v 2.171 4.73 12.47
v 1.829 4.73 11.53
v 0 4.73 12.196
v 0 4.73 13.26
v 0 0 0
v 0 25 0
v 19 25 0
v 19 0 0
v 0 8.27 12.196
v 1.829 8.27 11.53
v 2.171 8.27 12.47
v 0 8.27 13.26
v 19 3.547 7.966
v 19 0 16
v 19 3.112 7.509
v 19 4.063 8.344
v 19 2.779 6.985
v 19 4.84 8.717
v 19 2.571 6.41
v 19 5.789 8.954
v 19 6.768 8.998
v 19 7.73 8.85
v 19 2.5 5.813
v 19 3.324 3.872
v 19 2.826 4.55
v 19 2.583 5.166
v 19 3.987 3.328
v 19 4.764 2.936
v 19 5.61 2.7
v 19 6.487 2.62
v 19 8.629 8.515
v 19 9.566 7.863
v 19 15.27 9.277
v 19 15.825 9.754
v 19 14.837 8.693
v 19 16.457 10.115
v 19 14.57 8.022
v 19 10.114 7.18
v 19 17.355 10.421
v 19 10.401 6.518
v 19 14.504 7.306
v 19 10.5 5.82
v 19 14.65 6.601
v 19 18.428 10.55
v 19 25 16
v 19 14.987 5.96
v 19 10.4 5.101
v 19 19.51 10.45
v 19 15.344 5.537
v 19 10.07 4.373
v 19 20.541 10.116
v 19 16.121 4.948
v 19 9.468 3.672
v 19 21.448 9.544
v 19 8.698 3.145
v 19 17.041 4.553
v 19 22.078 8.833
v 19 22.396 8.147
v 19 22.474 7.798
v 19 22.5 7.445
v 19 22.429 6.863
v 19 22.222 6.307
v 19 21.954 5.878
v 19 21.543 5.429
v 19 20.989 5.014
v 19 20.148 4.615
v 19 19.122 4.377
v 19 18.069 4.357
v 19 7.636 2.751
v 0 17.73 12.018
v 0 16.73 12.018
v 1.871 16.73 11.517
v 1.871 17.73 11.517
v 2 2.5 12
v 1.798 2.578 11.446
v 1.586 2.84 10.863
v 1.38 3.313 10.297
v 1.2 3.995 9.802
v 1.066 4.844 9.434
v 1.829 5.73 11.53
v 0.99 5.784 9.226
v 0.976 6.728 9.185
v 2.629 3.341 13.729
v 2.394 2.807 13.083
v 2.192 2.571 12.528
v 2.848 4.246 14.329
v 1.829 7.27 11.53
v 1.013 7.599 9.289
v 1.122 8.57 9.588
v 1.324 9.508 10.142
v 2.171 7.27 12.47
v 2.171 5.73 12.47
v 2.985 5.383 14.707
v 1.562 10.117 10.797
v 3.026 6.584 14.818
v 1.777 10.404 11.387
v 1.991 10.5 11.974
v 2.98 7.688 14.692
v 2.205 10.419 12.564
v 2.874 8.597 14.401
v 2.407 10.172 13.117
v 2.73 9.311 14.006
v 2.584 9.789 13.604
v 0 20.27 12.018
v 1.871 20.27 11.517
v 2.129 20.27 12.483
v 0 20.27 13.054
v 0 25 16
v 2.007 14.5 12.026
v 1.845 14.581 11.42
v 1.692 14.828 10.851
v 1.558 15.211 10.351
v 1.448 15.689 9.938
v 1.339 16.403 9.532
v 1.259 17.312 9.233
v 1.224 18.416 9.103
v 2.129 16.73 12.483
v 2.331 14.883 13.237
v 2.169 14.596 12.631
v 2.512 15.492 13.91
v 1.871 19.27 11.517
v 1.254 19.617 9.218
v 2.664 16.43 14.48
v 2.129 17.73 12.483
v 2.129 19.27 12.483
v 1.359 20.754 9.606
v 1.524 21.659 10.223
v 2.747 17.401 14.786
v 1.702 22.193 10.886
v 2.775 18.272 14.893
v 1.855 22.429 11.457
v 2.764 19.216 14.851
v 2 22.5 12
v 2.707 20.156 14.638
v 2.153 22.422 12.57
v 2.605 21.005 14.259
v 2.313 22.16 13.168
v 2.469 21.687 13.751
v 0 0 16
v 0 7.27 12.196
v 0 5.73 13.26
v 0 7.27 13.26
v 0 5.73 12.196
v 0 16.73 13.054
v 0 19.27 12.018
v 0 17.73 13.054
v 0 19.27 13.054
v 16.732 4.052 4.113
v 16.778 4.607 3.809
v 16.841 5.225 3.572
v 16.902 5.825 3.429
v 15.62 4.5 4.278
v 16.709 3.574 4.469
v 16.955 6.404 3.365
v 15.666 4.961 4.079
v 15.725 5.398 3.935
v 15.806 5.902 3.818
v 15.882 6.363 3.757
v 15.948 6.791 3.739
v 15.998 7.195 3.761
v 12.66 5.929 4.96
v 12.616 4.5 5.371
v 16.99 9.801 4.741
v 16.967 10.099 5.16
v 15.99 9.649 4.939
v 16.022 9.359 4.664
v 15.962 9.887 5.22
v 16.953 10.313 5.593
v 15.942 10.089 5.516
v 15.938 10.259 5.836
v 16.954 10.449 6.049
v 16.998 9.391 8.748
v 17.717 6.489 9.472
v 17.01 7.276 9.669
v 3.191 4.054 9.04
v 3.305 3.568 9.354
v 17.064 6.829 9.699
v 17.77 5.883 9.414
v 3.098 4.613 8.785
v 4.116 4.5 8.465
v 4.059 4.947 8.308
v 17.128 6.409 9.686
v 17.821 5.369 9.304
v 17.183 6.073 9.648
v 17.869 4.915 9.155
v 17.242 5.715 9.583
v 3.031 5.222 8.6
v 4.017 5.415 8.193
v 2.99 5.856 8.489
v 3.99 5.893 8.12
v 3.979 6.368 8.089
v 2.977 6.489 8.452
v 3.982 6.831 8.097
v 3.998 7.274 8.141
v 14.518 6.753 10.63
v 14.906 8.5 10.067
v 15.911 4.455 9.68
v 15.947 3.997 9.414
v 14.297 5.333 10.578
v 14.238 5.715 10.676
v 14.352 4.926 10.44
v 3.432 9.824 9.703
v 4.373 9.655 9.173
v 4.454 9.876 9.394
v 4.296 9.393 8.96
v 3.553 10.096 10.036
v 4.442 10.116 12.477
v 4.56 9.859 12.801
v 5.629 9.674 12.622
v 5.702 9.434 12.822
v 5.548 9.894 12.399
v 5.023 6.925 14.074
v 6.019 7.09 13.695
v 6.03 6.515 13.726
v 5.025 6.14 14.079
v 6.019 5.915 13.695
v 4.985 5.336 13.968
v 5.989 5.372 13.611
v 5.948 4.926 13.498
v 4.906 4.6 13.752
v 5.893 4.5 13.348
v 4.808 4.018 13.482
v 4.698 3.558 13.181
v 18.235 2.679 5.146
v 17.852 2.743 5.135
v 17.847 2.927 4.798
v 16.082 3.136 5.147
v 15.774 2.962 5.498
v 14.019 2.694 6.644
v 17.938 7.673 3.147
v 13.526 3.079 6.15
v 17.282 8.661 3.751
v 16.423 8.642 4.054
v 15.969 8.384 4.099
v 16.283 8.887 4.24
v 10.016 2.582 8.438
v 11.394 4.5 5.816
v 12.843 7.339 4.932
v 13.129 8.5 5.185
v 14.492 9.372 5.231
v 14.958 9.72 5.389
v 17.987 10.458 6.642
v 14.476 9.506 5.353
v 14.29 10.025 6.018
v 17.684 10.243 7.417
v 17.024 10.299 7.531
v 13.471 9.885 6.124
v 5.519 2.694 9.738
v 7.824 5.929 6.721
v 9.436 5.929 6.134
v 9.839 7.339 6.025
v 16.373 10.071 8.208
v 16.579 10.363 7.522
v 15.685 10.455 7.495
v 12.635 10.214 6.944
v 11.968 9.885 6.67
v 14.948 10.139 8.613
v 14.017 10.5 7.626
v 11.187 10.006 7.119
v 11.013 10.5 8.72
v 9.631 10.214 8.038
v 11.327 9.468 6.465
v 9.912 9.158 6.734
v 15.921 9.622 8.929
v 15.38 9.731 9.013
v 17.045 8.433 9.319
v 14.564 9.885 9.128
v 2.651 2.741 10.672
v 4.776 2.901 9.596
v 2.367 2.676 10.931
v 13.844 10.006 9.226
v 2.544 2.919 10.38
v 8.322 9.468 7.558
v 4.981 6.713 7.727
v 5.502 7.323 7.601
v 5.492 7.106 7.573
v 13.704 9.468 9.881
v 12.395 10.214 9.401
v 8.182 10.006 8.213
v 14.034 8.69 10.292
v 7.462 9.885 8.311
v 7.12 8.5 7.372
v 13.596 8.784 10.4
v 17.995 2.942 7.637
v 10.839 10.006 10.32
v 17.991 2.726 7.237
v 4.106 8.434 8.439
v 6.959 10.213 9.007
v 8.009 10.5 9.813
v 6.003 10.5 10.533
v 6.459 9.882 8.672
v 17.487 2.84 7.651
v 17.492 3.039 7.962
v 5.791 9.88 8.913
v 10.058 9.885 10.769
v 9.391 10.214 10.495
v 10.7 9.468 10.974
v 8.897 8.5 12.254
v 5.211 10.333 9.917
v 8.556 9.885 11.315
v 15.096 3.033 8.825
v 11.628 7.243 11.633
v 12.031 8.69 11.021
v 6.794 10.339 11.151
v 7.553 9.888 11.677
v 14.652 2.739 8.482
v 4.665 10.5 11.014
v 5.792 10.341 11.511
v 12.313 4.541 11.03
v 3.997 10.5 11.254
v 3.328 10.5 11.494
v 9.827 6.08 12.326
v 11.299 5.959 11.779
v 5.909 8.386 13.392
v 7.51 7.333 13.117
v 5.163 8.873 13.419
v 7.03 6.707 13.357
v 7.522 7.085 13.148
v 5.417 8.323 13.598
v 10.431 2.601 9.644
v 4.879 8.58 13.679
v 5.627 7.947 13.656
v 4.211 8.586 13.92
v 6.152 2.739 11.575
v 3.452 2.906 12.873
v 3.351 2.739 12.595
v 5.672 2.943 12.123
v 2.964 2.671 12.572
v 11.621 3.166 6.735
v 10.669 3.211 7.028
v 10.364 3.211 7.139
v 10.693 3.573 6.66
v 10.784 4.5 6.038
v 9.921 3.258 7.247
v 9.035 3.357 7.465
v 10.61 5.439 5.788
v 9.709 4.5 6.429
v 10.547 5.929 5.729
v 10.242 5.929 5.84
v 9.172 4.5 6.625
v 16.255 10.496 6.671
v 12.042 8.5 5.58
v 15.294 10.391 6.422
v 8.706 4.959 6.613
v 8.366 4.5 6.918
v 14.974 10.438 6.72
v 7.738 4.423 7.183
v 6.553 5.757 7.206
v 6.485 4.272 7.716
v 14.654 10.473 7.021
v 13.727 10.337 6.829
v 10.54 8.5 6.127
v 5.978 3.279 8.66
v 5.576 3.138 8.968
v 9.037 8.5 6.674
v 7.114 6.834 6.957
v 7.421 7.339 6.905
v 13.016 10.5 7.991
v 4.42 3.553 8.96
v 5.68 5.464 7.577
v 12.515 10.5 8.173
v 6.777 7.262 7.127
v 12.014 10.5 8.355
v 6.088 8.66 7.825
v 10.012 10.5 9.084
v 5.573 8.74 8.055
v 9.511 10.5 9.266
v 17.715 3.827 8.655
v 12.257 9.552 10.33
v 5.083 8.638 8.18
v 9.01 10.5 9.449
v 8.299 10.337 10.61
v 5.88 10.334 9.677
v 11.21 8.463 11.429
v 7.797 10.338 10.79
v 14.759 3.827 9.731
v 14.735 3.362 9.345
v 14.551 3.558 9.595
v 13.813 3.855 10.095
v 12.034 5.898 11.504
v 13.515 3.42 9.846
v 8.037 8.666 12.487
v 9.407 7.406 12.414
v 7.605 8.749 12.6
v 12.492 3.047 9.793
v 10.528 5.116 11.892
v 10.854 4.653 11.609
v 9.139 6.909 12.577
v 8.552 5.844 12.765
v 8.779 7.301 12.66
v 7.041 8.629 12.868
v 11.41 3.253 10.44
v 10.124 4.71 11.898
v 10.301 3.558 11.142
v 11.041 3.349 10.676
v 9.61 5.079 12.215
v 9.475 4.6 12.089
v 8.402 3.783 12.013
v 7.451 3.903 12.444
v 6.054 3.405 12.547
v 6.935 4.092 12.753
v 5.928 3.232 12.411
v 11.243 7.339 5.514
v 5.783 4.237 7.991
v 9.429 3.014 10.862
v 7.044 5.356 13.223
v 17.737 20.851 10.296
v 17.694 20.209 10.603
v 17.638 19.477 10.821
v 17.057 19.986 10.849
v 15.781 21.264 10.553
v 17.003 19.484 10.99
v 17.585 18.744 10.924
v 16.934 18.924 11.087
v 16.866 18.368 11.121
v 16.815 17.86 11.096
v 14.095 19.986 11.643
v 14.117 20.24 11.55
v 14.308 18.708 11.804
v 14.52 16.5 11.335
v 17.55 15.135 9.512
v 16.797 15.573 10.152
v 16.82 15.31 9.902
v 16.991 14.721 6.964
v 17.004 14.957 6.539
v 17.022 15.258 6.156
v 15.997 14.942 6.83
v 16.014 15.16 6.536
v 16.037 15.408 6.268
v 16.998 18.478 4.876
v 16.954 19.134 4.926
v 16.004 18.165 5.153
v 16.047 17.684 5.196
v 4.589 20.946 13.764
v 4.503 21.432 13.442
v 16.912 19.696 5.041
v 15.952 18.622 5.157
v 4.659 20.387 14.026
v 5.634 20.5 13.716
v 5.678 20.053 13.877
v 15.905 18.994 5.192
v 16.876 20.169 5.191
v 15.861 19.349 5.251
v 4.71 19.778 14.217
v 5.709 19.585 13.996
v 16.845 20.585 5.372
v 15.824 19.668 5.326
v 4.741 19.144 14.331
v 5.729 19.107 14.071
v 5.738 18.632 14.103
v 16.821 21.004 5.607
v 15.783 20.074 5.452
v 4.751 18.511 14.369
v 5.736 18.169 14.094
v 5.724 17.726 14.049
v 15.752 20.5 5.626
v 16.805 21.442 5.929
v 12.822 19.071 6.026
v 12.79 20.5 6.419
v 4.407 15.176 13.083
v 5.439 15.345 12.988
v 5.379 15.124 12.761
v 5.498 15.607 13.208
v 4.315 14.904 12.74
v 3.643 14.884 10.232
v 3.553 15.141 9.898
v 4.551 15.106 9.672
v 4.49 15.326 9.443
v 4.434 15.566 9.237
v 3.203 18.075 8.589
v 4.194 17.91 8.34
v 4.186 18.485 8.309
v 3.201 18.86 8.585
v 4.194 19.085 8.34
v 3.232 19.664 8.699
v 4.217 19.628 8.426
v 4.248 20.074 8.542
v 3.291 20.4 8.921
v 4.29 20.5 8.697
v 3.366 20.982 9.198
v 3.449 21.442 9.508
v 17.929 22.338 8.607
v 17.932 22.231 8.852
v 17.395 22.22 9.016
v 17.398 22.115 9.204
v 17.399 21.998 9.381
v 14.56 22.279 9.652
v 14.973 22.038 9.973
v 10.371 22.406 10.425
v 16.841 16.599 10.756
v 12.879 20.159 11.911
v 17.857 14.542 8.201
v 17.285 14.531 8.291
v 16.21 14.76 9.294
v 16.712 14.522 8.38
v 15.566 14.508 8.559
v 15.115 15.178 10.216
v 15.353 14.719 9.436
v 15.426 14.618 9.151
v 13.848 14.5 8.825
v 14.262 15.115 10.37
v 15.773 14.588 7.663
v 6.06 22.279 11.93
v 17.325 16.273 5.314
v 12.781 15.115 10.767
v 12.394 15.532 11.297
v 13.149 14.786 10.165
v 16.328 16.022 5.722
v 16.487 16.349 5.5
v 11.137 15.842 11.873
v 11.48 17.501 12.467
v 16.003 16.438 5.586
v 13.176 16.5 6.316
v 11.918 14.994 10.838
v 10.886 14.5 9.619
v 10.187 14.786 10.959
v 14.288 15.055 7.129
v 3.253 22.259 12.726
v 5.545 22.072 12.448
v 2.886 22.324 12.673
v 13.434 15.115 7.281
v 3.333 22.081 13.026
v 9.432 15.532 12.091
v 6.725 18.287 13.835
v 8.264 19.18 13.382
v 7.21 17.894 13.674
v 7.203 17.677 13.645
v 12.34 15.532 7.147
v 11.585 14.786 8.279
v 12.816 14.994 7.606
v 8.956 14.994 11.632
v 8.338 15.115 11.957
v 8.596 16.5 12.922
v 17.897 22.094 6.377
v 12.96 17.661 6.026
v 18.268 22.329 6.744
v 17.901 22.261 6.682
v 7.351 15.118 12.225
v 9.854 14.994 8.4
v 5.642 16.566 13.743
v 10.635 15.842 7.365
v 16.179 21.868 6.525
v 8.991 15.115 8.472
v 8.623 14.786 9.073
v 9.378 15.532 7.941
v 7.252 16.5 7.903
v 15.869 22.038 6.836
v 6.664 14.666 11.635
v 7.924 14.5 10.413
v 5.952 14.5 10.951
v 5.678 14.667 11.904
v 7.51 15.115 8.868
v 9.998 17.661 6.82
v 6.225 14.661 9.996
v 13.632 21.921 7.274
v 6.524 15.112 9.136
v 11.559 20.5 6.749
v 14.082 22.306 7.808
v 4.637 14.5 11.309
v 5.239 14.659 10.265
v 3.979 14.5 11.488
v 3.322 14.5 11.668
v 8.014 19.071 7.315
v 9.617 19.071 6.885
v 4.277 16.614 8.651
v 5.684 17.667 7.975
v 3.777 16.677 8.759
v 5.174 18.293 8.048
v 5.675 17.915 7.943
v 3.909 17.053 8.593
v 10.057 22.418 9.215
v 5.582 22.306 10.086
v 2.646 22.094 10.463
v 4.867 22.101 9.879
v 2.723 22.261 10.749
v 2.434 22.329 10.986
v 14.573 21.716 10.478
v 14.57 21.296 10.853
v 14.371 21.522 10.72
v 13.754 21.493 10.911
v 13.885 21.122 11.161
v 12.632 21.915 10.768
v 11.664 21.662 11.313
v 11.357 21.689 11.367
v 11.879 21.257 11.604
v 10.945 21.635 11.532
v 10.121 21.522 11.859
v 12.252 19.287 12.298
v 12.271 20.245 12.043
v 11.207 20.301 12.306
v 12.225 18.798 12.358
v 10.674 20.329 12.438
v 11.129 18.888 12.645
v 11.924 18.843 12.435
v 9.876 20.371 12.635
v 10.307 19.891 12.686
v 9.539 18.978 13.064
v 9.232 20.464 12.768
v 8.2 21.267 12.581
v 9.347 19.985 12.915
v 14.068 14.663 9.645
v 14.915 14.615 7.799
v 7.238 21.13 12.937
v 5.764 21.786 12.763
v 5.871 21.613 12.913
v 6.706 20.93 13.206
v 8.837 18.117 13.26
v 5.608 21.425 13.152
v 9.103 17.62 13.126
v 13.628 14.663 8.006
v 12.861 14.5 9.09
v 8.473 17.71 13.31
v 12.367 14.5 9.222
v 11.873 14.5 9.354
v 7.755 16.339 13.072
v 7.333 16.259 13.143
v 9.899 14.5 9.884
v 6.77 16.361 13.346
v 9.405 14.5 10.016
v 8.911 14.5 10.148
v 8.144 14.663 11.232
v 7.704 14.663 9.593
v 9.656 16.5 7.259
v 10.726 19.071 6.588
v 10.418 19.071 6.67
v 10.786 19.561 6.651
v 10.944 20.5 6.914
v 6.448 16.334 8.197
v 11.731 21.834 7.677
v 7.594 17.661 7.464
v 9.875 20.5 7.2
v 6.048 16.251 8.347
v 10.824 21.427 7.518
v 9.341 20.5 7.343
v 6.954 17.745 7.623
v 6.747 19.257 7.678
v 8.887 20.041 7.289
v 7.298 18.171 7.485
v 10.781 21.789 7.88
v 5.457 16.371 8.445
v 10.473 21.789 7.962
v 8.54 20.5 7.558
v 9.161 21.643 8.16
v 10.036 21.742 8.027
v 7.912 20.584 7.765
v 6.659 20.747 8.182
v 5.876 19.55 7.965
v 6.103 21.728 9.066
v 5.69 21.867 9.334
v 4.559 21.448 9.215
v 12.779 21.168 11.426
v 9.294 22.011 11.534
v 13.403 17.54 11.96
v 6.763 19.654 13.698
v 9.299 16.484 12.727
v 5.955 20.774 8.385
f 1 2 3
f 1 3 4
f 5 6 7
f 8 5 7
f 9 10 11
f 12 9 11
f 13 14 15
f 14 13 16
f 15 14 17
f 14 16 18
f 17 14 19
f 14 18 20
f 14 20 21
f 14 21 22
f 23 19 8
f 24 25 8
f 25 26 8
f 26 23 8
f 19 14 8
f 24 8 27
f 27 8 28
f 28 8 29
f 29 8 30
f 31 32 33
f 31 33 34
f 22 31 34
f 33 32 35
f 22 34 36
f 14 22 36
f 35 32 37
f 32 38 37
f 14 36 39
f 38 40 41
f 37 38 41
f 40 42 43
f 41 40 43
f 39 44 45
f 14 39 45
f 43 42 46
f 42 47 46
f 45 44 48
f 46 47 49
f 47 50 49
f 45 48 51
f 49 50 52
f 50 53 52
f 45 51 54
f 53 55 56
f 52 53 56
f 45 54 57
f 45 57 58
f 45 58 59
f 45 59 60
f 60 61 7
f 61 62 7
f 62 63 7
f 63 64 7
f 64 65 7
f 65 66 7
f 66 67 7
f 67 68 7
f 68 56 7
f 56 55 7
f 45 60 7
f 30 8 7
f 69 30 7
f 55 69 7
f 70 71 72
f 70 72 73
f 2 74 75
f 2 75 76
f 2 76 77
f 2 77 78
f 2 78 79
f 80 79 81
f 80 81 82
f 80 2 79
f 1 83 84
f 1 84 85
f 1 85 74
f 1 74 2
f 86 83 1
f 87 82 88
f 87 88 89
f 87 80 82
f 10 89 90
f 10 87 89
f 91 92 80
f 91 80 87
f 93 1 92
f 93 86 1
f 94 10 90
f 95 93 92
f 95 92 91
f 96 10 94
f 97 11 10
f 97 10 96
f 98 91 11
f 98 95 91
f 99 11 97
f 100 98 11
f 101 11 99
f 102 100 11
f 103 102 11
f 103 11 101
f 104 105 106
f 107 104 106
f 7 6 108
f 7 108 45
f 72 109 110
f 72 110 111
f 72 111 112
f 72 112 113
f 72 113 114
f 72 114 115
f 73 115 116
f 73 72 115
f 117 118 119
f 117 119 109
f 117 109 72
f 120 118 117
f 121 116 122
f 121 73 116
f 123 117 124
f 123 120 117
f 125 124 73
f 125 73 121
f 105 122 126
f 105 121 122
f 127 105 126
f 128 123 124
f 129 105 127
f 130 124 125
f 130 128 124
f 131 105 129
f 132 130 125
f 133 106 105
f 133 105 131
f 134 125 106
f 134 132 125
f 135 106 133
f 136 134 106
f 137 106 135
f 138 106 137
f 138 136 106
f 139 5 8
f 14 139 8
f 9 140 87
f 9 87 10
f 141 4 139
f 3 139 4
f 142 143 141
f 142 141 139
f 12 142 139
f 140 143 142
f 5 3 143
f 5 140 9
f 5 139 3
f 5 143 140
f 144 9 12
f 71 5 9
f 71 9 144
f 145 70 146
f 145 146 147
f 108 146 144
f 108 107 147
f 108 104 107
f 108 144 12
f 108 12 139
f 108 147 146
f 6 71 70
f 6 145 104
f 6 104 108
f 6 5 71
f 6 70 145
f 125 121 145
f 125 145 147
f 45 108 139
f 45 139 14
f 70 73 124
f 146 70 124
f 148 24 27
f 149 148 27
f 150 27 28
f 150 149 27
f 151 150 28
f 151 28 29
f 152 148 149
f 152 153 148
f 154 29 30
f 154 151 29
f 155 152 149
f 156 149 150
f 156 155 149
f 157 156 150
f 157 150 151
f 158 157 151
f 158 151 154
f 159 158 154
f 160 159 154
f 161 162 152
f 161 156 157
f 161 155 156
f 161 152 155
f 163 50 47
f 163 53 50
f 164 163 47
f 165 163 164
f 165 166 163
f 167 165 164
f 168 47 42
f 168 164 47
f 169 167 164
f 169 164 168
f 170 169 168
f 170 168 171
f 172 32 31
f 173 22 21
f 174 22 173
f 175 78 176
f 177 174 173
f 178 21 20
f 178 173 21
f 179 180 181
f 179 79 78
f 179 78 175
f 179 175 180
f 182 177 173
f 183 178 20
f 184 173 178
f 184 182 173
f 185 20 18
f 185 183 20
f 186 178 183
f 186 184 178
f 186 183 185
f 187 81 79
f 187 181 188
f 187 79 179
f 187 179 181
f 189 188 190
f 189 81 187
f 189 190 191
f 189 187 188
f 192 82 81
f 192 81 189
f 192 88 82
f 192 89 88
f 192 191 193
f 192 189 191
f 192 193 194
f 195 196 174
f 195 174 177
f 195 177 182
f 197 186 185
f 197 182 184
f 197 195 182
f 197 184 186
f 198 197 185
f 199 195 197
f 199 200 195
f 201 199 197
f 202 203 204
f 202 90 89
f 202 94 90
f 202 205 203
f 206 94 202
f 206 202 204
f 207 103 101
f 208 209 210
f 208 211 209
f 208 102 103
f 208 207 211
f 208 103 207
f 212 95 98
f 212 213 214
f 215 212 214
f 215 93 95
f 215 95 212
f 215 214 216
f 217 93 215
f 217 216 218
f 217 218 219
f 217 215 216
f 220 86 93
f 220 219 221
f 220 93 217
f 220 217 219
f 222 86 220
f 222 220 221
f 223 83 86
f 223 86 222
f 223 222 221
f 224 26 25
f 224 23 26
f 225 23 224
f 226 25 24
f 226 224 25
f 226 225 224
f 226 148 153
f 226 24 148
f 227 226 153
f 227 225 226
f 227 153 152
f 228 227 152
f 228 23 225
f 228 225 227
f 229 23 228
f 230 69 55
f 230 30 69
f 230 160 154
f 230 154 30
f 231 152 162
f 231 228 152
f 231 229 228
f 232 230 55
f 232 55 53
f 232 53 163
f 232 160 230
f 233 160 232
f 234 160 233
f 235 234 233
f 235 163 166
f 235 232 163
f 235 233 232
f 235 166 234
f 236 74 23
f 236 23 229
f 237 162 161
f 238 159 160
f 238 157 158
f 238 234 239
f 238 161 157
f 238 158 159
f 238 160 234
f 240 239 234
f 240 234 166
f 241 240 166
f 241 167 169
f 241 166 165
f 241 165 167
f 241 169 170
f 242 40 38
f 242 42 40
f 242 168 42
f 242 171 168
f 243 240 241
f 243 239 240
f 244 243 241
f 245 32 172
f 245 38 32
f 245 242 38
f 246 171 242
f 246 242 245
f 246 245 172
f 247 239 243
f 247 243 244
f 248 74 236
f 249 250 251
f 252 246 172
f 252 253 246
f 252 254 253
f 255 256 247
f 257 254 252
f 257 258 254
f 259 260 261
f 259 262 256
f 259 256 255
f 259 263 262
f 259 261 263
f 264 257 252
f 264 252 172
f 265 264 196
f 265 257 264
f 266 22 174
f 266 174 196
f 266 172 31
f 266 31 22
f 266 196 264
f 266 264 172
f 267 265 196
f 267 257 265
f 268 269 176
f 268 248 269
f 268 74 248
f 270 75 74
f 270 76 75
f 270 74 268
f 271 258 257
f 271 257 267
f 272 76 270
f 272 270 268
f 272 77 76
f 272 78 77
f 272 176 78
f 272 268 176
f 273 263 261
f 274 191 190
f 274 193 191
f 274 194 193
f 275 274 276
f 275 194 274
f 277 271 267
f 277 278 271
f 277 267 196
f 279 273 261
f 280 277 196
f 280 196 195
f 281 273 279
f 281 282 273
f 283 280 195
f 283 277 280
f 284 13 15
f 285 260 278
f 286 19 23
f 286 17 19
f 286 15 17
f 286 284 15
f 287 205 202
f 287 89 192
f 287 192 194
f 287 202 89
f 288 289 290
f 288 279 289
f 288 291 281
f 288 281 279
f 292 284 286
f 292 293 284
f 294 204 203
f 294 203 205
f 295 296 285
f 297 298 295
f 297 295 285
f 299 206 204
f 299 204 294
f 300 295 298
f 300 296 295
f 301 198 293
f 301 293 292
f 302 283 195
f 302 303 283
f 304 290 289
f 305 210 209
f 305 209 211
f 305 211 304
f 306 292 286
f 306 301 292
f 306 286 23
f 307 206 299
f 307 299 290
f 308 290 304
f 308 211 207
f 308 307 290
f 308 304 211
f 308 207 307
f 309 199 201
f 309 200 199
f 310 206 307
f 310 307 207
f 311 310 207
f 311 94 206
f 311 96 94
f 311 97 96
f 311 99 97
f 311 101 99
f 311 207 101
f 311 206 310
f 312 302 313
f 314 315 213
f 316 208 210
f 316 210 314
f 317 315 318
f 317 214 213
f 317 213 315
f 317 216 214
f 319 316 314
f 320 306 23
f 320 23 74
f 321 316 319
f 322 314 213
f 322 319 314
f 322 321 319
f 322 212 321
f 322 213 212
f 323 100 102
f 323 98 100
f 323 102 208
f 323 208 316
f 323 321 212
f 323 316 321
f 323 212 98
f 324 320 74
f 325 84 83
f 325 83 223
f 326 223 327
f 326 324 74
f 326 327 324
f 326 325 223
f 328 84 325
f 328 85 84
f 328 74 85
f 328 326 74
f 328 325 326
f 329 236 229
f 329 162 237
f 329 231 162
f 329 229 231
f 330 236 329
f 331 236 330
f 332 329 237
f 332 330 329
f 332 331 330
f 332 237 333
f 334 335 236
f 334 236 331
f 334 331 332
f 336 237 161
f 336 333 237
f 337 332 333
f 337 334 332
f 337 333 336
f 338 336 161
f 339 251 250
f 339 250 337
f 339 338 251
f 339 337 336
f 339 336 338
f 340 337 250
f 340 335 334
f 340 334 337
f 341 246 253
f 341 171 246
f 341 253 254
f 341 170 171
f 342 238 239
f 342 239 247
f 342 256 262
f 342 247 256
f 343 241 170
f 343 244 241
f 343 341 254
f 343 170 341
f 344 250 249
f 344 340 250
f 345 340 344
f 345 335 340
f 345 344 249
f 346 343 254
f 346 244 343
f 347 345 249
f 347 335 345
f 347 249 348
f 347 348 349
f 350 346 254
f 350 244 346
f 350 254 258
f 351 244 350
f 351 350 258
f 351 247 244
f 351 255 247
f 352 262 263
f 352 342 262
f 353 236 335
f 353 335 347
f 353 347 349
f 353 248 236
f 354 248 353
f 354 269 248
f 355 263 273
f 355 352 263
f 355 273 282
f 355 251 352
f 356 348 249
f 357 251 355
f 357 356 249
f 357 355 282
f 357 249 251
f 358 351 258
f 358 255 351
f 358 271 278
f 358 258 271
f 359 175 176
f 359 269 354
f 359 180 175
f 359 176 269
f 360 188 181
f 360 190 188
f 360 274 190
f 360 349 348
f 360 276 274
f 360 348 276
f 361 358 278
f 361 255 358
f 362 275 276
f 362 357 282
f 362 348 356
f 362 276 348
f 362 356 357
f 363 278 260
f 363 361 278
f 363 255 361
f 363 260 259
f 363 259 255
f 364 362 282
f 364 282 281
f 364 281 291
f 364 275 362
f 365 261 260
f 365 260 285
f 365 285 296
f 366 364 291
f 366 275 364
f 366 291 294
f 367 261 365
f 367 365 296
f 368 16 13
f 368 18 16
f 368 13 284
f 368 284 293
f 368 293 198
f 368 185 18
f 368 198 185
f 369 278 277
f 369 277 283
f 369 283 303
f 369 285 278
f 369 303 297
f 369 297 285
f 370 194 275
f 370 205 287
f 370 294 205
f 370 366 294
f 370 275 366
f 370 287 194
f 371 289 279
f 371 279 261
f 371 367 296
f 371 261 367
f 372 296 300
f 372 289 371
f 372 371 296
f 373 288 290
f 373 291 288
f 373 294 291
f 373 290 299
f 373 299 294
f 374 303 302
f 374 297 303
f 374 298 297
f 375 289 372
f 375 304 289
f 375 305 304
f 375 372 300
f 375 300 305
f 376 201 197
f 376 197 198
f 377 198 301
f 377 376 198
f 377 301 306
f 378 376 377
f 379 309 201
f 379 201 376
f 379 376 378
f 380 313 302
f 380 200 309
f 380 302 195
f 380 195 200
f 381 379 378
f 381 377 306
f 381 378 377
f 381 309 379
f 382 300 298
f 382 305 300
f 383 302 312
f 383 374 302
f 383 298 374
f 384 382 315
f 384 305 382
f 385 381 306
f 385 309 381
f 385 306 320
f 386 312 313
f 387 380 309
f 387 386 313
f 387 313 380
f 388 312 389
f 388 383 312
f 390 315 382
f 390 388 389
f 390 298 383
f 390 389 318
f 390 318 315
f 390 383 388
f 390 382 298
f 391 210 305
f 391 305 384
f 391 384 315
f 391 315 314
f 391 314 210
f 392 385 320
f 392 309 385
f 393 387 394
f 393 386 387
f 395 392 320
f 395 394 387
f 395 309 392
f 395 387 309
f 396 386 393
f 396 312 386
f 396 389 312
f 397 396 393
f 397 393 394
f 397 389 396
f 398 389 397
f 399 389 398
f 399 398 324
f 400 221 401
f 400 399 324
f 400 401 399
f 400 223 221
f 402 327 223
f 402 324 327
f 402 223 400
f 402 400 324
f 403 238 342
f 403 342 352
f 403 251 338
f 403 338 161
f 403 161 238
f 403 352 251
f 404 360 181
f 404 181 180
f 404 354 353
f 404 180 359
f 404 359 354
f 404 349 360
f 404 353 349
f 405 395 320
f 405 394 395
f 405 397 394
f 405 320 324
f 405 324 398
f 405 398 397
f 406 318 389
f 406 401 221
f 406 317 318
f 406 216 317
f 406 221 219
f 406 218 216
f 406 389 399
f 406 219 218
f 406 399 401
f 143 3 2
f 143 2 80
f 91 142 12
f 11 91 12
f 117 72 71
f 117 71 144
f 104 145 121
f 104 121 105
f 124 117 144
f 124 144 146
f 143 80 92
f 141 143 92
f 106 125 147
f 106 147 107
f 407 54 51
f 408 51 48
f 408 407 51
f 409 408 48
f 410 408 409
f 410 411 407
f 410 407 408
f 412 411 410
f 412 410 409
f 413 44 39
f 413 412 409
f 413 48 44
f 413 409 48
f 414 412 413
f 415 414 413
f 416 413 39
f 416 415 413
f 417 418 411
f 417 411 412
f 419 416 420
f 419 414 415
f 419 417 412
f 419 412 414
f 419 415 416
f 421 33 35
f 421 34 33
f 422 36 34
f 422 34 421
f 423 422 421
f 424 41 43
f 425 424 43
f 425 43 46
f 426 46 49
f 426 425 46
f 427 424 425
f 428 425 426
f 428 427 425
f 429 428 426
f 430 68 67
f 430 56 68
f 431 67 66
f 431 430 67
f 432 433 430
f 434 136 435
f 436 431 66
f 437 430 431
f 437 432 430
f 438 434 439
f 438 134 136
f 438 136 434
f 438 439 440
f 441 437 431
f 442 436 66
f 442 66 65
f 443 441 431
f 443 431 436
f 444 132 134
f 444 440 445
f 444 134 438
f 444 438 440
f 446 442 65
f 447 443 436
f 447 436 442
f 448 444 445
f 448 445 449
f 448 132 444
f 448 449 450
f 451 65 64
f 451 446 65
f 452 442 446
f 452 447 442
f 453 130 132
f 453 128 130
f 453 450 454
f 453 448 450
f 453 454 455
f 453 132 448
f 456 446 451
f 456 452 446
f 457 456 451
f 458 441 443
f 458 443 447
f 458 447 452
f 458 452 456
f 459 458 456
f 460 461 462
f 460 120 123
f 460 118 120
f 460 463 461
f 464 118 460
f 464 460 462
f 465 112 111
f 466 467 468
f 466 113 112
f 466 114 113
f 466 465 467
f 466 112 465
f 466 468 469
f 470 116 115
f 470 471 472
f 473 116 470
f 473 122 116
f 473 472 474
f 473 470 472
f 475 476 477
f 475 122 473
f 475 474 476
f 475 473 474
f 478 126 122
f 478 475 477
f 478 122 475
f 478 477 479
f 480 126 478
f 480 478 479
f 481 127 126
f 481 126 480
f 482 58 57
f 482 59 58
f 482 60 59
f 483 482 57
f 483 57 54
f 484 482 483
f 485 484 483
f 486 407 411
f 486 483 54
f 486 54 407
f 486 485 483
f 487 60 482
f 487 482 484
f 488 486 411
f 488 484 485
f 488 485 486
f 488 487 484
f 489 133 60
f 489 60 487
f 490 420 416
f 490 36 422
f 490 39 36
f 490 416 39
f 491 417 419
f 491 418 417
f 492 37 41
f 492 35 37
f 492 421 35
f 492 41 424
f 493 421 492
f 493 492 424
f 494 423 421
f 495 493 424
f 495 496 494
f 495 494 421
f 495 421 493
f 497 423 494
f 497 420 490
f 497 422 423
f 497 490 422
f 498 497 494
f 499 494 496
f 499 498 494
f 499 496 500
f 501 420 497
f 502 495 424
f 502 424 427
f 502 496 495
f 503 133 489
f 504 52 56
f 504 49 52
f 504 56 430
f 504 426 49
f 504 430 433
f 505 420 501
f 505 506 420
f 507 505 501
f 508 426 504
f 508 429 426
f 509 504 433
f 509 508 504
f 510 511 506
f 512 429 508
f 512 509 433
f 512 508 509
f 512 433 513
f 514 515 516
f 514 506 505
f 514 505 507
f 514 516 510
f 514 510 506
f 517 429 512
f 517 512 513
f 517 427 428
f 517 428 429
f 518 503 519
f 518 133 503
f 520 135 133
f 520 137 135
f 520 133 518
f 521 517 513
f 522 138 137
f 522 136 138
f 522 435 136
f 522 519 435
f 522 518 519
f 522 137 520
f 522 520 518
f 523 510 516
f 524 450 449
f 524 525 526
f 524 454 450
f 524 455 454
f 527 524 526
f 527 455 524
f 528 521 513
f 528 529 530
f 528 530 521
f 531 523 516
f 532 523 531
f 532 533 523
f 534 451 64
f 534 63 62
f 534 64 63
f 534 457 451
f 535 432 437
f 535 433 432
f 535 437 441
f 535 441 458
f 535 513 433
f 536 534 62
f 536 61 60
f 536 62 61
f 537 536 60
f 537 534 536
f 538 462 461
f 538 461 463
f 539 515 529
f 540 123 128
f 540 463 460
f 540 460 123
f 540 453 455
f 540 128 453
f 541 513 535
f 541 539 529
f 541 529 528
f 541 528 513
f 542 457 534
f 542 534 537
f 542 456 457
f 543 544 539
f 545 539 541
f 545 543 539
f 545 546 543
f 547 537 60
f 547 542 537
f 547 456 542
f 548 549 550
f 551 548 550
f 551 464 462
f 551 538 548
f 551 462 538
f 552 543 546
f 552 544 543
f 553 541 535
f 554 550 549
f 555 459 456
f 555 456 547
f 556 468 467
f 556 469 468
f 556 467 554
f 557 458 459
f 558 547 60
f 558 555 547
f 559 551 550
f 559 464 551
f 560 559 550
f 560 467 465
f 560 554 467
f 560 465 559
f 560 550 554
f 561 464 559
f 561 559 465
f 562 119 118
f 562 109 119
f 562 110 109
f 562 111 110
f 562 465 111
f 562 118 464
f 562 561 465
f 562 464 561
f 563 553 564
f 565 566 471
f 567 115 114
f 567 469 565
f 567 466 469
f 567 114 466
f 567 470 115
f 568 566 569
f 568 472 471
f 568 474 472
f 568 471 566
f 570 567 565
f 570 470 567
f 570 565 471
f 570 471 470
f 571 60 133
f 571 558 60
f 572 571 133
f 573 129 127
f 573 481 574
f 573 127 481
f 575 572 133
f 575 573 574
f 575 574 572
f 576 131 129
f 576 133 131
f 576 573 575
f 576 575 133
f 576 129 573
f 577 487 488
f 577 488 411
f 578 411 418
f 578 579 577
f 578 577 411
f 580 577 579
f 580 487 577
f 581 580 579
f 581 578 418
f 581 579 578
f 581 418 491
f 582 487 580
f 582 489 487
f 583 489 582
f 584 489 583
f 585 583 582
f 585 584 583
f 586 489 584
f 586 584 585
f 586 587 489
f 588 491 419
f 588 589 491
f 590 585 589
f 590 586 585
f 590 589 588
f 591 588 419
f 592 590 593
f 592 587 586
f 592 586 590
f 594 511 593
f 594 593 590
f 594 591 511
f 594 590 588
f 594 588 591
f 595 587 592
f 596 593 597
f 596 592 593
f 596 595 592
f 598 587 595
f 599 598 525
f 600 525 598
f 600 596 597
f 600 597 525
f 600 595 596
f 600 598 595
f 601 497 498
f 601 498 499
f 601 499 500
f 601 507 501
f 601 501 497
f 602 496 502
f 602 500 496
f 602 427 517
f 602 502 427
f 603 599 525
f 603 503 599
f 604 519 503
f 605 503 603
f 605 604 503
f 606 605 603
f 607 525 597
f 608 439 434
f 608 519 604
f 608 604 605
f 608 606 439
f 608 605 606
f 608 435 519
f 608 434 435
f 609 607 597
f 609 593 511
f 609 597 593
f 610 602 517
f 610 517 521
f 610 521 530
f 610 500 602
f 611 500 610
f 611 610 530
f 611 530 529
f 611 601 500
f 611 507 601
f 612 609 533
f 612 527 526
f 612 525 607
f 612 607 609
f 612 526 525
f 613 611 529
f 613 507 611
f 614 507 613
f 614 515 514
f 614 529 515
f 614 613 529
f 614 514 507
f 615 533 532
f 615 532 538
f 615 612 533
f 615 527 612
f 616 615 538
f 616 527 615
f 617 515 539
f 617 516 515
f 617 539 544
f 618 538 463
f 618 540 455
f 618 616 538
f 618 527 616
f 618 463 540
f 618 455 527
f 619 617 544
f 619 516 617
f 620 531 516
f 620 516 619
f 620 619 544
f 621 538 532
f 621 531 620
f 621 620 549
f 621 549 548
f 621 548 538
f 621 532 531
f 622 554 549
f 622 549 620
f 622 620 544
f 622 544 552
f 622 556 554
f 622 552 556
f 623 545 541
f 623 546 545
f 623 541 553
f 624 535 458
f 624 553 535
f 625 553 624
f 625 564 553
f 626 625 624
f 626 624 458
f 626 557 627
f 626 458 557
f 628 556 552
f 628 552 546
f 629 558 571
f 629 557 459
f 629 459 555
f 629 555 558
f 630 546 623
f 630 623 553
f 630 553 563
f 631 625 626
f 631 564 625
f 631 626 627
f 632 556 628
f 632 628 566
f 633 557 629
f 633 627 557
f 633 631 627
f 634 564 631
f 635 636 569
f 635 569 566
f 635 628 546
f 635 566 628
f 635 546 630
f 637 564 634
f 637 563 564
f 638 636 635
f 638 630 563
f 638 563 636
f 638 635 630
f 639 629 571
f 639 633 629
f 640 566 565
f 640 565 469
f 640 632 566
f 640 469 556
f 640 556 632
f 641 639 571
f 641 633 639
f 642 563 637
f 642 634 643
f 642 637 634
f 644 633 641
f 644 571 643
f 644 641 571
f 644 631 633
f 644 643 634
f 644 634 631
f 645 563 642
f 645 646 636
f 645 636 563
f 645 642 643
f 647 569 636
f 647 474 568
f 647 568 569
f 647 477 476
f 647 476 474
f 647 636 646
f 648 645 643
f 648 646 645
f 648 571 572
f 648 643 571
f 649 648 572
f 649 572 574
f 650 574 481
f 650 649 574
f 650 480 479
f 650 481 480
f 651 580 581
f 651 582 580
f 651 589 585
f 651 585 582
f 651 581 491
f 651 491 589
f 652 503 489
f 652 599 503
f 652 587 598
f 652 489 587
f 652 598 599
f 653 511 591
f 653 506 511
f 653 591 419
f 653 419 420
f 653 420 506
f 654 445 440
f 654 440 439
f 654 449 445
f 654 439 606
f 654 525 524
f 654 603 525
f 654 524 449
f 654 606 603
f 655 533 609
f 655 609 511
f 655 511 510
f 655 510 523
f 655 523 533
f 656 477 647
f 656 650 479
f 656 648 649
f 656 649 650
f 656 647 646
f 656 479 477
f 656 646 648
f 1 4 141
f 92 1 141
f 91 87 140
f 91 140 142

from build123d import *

# Parameters (mm, degrees)
F0_W      = 19
F0_H      = 25
F1_DEPTH  = 16
F8_DEPTH  = 19.527568
F9_DEPTH  = 20.080016
F10_W     = 1
F10_H     = 1
F12_DEPTH = 3.248466
F11_W     = 1
F11_H     = 1
F13_DEPTH = 2.968128


with BuildPart() as f1:
    # F0 (on Top) → F1 (new body)
    with BuildSketch(Plane.XY):
        with Locations((9.5, 12.5)):
            Rectangle(F0_W, F0_H)
    extrude(amount=F1_DEPTH)

    # F6 (on face) → F8 (cut, through all)
    with BuildSketch(Plane(origin=(-1.133975, 0, 0.303848), x_dir=(0, 1, 0), z_dir=(0.965926, 0, -0.258819))):
        with BuildLine():
            add(Edge.make_bspline(
                [(22.5, 12.108748), (22.5, 17.3049), (16.5, 14.706824), (10.5, 12.108748), (16.5, 9.510672), (22.5, 6.912596), (22.5, 12.108748)],
                knots=[0, 0, 0, 2.094395, 2.094395, 4.18879, 4.18879, 6.283185, 6.283185, 6.283185], degree=2, weights=[1, 0.5, 1, 0.5, 1, 0.5, 1]))
        make_face()
    extrude(amount=F8_DEPTH, mode=Mode.SUBTRACT)

    # F7 (on face) → F9 (cut, through all)
    with BuildSketch(Plane(origin=(-2.090681, 0, 0.760946), x_dir=(0, 1, 0), z_dir=(0.939693, 0, -0.34202))):
        with BuildLine():
            add(Edge.make_bspline(
                [(2.5, 11.960352), (2.5, 6.764199), (8.5, 9.362276), (14.5, 11.960352), (8.5, 14.558428), (2.5, 17.156504), (2.5, 11.960352)],
                knots=[0, 0, 0, 2.094395, 2.094395, 4.18879, 4.18879, 6.283185, 6.283185, 6.283185], degree=2, weights=[1, 0.5, 1, 0.5, 1, 0.5, 1]))
        make_face()
    extrude(amount=F9_DEPTH, mode=Mode.SUBTRACT)

    # F10 (on face) → F12 (cut, through all)
    with BuildSketch(Plane(origin=(-2.090681, 0, 0.760946), x_dir=(0, 1, 0), z_dir=(0.939693, 0, -0.34202))):
        with Locations((7.77, 11.960352)):
            Rectangle(F10_W, F10_H)
        with Locations((5.23, 11.960352)):
            Rectangle(F10_W, F10_H)
    extrude(amount=-F12_DEPTH, mode=Mode.SUBTRACT)

    # F11 (on face) → F13 (cut, through all)
    with BuildSketch(Plane(origin=(-1.133975, 0, 0.303848), x_dir=(0, 1, 0), z_dir=(0.965926, 0, -0.258819))):
        with Locations((17.23, 12.108748)):
            Rectangle(F11_W, F11_H)
        with Locations((19.77, 12.108748)):
            Rectangle(F11_W, F11_H)
    extrude(amount=-F13_DEPTH, mode=Mode.SUBTRACT)


solid = f1.part
